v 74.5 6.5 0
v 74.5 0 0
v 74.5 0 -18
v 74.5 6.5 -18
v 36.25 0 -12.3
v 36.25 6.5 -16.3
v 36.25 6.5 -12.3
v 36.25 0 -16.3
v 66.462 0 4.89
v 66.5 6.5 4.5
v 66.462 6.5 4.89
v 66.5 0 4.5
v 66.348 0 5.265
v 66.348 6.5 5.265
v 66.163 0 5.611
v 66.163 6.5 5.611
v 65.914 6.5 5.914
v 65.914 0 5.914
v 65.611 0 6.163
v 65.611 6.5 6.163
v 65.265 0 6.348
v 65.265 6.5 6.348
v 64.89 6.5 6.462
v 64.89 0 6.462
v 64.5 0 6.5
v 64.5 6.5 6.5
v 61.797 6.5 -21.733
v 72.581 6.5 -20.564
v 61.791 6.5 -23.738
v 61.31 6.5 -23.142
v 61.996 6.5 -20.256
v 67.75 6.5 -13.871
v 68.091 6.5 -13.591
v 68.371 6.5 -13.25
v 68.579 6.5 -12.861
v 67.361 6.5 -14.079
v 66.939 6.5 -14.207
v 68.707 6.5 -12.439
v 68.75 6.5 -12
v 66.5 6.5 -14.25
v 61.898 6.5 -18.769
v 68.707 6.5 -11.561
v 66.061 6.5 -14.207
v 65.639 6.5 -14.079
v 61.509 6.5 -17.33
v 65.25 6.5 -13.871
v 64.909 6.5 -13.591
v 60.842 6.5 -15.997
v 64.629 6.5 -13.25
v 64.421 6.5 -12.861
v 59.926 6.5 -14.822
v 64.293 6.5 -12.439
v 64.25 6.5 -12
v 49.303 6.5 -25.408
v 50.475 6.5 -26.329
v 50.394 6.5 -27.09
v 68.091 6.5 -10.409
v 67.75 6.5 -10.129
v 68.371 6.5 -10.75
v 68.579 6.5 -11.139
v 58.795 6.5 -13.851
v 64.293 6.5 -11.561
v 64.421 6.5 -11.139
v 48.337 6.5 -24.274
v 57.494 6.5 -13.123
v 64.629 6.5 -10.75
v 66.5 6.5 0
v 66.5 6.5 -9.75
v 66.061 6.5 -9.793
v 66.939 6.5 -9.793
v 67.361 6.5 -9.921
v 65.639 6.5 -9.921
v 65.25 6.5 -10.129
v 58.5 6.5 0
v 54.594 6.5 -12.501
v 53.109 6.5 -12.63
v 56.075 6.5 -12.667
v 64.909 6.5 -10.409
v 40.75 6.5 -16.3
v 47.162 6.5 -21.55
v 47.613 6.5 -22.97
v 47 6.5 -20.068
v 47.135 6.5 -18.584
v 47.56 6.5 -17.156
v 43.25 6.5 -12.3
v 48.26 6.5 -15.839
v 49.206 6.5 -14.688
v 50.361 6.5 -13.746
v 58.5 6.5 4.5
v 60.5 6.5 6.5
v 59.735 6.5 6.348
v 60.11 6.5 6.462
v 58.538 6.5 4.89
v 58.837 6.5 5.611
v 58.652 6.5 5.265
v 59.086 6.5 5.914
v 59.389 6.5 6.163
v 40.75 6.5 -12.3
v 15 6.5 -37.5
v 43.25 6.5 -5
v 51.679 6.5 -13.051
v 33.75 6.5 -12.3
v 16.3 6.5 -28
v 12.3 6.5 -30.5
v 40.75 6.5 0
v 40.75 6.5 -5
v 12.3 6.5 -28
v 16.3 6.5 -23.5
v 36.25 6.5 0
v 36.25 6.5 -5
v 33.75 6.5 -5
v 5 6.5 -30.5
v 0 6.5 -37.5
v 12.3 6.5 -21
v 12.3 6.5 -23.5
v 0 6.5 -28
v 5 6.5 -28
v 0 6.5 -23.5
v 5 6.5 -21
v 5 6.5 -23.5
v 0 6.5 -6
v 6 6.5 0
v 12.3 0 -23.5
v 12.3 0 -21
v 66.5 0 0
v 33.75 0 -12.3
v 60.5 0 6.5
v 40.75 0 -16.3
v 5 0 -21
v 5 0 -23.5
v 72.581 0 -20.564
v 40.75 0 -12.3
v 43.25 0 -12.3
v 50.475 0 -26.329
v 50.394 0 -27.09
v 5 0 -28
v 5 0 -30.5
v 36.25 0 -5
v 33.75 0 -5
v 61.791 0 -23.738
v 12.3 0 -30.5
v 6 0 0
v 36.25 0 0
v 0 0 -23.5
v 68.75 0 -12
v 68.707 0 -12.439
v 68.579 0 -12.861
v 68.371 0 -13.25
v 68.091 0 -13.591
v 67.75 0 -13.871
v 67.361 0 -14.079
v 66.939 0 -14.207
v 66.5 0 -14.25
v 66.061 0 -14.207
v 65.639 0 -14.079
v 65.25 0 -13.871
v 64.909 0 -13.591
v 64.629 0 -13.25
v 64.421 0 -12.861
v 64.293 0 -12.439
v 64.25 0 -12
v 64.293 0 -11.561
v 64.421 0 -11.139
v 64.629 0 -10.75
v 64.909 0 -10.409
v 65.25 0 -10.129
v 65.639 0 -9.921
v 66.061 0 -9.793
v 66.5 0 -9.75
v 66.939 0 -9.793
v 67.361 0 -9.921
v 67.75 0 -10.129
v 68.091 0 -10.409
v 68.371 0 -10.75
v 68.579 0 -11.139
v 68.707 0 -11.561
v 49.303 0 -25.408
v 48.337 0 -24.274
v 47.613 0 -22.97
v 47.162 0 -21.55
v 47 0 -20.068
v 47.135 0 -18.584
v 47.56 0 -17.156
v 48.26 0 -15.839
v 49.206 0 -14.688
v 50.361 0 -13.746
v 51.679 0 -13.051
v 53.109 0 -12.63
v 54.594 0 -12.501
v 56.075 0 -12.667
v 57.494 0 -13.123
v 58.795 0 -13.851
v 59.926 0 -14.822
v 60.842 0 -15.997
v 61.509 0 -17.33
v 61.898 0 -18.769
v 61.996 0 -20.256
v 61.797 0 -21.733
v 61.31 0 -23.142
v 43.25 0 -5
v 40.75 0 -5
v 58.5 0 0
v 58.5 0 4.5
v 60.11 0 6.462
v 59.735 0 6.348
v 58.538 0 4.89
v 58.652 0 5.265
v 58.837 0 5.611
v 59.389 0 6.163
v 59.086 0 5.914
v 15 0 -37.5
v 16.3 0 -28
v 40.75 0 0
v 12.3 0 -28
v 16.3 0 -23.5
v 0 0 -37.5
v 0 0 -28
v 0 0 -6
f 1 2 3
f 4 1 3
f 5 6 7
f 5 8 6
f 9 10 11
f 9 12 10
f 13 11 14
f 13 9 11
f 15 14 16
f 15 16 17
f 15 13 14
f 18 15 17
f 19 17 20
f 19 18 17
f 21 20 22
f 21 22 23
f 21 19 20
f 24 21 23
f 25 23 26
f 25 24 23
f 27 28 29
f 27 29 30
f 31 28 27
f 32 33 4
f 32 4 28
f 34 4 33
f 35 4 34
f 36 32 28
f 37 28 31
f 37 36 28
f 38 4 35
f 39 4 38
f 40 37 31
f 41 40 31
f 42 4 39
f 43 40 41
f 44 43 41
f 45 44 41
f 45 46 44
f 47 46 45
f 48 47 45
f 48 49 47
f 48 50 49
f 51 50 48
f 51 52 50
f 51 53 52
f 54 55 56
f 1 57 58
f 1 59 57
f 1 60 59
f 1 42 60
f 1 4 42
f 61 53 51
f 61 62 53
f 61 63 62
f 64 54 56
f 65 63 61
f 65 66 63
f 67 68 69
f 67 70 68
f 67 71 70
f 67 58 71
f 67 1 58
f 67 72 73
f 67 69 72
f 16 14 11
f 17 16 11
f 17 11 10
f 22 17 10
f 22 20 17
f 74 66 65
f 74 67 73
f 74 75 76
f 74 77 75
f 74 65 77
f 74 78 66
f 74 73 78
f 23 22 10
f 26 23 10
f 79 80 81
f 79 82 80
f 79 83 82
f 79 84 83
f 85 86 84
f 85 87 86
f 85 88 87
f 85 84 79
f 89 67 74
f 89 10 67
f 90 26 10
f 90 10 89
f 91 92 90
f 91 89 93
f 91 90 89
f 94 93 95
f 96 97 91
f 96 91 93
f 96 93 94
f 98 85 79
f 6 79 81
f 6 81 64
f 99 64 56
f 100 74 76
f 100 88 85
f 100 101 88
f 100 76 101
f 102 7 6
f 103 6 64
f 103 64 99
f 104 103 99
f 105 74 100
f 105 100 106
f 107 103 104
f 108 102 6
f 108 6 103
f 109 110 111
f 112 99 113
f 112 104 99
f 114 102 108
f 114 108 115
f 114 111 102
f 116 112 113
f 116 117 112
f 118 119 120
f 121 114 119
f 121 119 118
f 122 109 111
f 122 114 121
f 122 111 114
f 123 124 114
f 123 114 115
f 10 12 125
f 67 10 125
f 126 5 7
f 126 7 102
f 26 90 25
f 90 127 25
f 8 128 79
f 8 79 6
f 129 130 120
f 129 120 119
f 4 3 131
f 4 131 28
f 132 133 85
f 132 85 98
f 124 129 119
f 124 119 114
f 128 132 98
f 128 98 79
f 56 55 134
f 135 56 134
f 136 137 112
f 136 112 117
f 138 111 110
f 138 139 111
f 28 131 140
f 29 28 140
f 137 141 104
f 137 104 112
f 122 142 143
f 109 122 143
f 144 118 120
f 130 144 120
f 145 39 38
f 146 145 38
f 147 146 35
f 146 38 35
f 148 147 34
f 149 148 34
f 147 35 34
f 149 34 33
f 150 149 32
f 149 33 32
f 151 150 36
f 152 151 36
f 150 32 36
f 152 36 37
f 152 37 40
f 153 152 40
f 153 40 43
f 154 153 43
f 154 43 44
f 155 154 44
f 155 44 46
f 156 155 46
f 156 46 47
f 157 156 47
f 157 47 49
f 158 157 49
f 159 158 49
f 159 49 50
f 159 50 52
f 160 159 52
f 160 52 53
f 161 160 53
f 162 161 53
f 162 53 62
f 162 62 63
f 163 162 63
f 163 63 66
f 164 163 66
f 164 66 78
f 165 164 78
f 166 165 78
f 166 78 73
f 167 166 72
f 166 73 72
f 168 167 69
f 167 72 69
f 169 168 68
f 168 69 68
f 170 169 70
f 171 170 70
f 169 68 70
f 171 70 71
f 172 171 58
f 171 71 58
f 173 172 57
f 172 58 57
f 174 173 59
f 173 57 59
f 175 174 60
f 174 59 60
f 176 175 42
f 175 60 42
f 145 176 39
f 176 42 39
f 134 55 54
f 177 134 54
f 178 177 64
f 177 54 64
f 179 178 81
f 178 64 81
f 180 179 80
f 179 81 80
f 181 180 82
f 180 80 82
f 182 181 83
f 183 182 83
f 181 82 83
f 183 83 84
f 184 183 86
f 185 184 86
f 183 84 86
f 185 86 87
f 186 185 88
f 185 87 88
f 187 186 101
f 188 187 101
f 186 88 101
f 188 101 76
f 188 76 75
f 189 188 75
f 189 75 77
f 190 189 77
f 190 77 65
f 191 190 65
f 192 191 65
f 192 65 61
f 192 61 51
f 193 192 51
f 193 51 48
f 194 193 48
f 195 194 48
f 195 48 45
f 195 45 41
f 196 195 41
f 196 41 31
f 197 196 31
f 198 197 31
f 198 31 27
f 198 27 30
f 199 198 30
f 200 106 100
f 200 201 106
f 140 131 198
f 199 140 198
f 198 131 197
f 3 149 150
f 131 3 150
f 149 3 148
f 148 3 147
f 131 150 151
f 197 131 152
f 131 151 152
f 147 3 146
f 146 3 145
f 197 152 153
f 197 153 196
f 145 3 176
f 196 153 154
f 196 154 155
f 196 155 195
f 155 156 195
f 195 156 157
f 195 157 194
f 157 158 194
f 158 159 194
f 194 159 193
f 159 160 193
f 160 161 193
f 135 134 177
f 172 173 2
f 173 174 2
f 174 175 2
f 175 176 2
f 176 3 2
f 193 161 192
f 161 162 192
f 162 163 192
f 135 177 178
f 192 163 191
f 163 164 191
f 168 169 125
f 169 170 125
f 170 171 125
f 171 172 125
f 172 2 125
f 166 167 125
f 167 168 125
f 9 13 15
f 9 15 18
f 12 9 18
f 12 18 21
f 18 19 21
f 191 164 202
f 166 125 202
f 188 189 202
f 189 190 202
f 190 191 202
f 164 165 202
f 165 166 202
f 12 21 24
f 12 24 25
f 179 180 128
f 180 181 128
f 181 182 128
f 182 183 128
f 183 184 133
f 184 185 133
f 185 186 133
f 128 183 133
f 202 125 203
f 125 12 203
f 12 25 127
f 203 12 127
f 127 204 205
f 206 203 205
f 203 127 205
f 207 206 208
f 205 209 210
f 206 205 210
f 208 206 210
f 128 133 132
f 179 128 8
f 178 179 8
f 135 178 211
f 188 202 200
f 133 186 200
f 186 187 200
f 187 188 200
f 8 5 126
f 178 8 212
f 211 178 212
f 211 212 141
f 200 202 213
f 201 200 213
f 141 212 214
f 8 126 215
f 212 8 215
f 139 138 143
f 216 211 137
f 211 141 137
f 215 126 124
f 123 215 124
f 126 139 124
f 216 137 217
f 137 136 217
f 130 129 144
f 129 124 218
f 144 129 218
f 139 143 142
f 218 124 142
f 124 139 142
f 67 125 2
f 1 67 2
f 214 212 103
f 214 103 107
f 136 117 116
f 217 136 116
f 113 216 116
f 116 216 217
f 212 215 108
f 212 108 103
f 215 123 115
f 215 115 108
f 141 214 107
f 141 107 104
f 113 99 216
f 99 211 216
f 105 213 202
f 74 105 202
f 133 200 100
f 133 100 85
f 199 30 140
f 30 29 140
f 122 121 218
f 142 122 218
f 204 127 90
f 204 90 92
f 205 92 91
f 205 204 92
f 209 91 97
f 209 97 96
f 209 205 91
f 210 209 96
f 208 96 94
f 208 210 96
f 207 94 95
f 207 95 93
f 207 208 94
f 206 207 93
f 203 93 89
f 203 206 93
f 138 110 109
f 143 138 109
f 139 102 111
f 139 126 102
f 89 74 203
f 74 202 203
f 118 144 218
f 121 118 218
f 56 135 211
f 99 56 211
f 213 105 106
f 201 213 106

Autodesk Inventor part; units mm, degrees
ref_plane "YZ Plane" through (0, 0, 0) normal (1, 0, 0) x (0, 1, 0)
ref_plane "XZ Plane" through (0, 0, 0) normal (0, 1, 0) x (-1, 0, 0)
ref_plane "XY Plane" through (0, 0, 0) normal (0, 0, 1) x (1, 0, 0)
sketch "Sketch1" plane through (0, 0, 0) normal (0, 1, 0) x (-1, 0, 0)
  line L0 (0, -37.5) -> (0, 0)
  line L1 (0, 0) -> (-74.5, 0)
  line L2 (-74.5, 0) -> (-74.5, -20)
  line L3 (-74.5, -20) -> (-15, -37.5)
  line L4 (-15, -37.5) -> (0, -37.5)
  dimension "d0" = 37.5
  dimension "d1" = 74.5
  dimension "d2" = 20
  dimension "d3" = 15
extrude "Extrusion1" add sketch "Sketch1" along normal blind 6.5
sketch "Sketch2" plane through (0, 0, 0) normal (0, -1, 0) x (1, 0, 0)
  line L0 (0, 0) -> (0, -37.5) projected
  line L1 (0, -37.5) -> (15, -37.5) projected
  line L2 (16.3, -23.5) -> (16.3, -28)
  line L3 (0, -28) -> (0, -23.5)
  line L4 (5, -21) -> (12.3, -21)
  line L5 (12.3, -30.5) -> (5, -30.5)
  line L6 (0, -23.5) -> (5, -23.5)
  line L7 (12.3, -23.5) -> (16.3, -23.5)
  line L8 (16.3, -28) -> (12.3, -28)
  line L9 (5, -28) -> (0, -28)
  line L10 (5, -30.5) -> (5, -28)
  line L11 (5, -23.5) -> (5, -21)
  line L12 (12.3, -21) -> (12.3, -23.5)
  line L13 (12.3, -28) -> (12.3, -30.5)
  point P0 (16.3, -25.75)
  dimension "d6" = 4.5
  dimension "d7" = 2.5
  dimension "d8" = 5
  dimension "d9" = 7.3
  dimension "d10" = 4
  dimension "d12" = 14
extrude "Extrusion2" cut sketch "Sketch2" against normal through all
sketch "Sketch3" plane through (0, 0, 0) normal (0, -1, 0) x (1, 0, 0)
  line L0 (74.5, -20) -> (74.5, 0) projected
  line L1 (74.5, 0) -> (0, 0) projected
  line L2 (66.5, 0) -> (58.5, 0)
  line L3 (58.5, 0) -> (58.5, 4.5)
  line L4 (60.5, 6.5) -> (64.5, 6.5)
  line L5 (66.5, 4.5) -> (66.5, 0)
  arc A0 (60.5, 6.5) -> (58.5, 4.5) centre (60.5, 4.5) ccw
  arc A1 (66.5, 4.5) -> (64.5, 6.5) centre (64.5, 4.5) ccw
  dimension "d15" = 2
  dimension "d16" = 8
  dimension "d17" = 6.5
  dimension "d18" = 8
extrude "Extrusion3" add sketch "Sketch3" against normal blind 6.5
sketch "Sketch4" plane through (0, 0, 0) normal (0, -1, 0) x (1, 0, 0)
  line L0 (58.5, 4.5) -> (58.5, 0) projected
  line L1 (58.5, 0) -> (0, 0) projected
  line L2 (36.25, 0) -> (40.75, 0)
  line L3 (40.75, -16.3) -> (36.25, -16.3)
  line L4 (43.25, -5) -> (43.25, -12.3)
  line L5 (33.75, -12.3) -> (33.75, -5)
  line L6 (33.75, -5) -> (36.25, -5)
  line L7 (40.75, -5) -> (43.25, -5)
  line L8 (43.25, -12.3) -> (40.75, -12.3)
  line L9 (36.25, -12.3) -> (33.75, -12.3)
  line L10 (36.25, -16.3) -> (36.25, -12.3)
  line L11 (36.25, -5) -> (36.25, 0)
  line L12 (40.75, 0) -> (40.75, -5)
  line L13 (40.75, -12.3) -> (40.75, -16.3)
  point P0 (38.5, -16.3)
  dimension "d21" = 4.5
  dimension "d22" = 2.5
  dimension "d23" = 5
  dimension "d24" = 4
  dimension "d25" = 7.3
  dimension "d26" = 20
extrude "Extrusion4" cut sketch "Sketch4" against normal through all
sketch "Sketch6" plane through (0, 6.5, 0) normal (0, 1, 0) x (1, 0, 0)
  line L0 (40.75, 0) -> (58.5, 0) projected
  line L1 (74.5, 0) -> (74.5, 20) projected
  line L2 (74.5, 20) -> (15, 37.5) projected
  arc A0 (51.3532, 26.8079) -> (60.8316, 24.0201) centre (54.5, 20) ccw
  circle A1 centre (54.5, 20) radius 4 construction
  line L3 (51.3532, 26.8079) -> (60.8316, 24.0201)
  dimension "d34" = 15
  dimension "d35" = 8
  dimension "d36" = 20
  dimension "d37" = 20
extrude "Extrusion6" cut sketch "Sketch6" against normal through all
chamfer "Chamfer1" distance 1 angle 45 2 edges at (51.3532, 3.25, -26.8079) (60.8316, 3.25, -24.0201)
chamfer "Chamfer2" distance 2 angle 45 1 edges at (74.5, 3.25, -20)
chamfer "Chamfer3" distance 6 angle 45 1 edges at (0, 3.25, 0)
sketch "Sketch7" plane through (0, 6.5, 0) normal (0, 1, 0) x (1, 0, 0)
  line L0 (66.5, 0) -> (74.5, 0) projected
  line L1 (74.5, 0) -> (74.5, 18) projected
  circle A0 centre (66.5, 12) radius 2.25
  point P0 (0, 0)
  dimension "d49" = 4.5
  dimension "d50" = 8
  dimension "d51" = 12
extrude "Extrusion7" cut sketch "Sketch7" against normal through all
properties part number "x_carryage_brace_bottom" material "Plywood, Finish"
